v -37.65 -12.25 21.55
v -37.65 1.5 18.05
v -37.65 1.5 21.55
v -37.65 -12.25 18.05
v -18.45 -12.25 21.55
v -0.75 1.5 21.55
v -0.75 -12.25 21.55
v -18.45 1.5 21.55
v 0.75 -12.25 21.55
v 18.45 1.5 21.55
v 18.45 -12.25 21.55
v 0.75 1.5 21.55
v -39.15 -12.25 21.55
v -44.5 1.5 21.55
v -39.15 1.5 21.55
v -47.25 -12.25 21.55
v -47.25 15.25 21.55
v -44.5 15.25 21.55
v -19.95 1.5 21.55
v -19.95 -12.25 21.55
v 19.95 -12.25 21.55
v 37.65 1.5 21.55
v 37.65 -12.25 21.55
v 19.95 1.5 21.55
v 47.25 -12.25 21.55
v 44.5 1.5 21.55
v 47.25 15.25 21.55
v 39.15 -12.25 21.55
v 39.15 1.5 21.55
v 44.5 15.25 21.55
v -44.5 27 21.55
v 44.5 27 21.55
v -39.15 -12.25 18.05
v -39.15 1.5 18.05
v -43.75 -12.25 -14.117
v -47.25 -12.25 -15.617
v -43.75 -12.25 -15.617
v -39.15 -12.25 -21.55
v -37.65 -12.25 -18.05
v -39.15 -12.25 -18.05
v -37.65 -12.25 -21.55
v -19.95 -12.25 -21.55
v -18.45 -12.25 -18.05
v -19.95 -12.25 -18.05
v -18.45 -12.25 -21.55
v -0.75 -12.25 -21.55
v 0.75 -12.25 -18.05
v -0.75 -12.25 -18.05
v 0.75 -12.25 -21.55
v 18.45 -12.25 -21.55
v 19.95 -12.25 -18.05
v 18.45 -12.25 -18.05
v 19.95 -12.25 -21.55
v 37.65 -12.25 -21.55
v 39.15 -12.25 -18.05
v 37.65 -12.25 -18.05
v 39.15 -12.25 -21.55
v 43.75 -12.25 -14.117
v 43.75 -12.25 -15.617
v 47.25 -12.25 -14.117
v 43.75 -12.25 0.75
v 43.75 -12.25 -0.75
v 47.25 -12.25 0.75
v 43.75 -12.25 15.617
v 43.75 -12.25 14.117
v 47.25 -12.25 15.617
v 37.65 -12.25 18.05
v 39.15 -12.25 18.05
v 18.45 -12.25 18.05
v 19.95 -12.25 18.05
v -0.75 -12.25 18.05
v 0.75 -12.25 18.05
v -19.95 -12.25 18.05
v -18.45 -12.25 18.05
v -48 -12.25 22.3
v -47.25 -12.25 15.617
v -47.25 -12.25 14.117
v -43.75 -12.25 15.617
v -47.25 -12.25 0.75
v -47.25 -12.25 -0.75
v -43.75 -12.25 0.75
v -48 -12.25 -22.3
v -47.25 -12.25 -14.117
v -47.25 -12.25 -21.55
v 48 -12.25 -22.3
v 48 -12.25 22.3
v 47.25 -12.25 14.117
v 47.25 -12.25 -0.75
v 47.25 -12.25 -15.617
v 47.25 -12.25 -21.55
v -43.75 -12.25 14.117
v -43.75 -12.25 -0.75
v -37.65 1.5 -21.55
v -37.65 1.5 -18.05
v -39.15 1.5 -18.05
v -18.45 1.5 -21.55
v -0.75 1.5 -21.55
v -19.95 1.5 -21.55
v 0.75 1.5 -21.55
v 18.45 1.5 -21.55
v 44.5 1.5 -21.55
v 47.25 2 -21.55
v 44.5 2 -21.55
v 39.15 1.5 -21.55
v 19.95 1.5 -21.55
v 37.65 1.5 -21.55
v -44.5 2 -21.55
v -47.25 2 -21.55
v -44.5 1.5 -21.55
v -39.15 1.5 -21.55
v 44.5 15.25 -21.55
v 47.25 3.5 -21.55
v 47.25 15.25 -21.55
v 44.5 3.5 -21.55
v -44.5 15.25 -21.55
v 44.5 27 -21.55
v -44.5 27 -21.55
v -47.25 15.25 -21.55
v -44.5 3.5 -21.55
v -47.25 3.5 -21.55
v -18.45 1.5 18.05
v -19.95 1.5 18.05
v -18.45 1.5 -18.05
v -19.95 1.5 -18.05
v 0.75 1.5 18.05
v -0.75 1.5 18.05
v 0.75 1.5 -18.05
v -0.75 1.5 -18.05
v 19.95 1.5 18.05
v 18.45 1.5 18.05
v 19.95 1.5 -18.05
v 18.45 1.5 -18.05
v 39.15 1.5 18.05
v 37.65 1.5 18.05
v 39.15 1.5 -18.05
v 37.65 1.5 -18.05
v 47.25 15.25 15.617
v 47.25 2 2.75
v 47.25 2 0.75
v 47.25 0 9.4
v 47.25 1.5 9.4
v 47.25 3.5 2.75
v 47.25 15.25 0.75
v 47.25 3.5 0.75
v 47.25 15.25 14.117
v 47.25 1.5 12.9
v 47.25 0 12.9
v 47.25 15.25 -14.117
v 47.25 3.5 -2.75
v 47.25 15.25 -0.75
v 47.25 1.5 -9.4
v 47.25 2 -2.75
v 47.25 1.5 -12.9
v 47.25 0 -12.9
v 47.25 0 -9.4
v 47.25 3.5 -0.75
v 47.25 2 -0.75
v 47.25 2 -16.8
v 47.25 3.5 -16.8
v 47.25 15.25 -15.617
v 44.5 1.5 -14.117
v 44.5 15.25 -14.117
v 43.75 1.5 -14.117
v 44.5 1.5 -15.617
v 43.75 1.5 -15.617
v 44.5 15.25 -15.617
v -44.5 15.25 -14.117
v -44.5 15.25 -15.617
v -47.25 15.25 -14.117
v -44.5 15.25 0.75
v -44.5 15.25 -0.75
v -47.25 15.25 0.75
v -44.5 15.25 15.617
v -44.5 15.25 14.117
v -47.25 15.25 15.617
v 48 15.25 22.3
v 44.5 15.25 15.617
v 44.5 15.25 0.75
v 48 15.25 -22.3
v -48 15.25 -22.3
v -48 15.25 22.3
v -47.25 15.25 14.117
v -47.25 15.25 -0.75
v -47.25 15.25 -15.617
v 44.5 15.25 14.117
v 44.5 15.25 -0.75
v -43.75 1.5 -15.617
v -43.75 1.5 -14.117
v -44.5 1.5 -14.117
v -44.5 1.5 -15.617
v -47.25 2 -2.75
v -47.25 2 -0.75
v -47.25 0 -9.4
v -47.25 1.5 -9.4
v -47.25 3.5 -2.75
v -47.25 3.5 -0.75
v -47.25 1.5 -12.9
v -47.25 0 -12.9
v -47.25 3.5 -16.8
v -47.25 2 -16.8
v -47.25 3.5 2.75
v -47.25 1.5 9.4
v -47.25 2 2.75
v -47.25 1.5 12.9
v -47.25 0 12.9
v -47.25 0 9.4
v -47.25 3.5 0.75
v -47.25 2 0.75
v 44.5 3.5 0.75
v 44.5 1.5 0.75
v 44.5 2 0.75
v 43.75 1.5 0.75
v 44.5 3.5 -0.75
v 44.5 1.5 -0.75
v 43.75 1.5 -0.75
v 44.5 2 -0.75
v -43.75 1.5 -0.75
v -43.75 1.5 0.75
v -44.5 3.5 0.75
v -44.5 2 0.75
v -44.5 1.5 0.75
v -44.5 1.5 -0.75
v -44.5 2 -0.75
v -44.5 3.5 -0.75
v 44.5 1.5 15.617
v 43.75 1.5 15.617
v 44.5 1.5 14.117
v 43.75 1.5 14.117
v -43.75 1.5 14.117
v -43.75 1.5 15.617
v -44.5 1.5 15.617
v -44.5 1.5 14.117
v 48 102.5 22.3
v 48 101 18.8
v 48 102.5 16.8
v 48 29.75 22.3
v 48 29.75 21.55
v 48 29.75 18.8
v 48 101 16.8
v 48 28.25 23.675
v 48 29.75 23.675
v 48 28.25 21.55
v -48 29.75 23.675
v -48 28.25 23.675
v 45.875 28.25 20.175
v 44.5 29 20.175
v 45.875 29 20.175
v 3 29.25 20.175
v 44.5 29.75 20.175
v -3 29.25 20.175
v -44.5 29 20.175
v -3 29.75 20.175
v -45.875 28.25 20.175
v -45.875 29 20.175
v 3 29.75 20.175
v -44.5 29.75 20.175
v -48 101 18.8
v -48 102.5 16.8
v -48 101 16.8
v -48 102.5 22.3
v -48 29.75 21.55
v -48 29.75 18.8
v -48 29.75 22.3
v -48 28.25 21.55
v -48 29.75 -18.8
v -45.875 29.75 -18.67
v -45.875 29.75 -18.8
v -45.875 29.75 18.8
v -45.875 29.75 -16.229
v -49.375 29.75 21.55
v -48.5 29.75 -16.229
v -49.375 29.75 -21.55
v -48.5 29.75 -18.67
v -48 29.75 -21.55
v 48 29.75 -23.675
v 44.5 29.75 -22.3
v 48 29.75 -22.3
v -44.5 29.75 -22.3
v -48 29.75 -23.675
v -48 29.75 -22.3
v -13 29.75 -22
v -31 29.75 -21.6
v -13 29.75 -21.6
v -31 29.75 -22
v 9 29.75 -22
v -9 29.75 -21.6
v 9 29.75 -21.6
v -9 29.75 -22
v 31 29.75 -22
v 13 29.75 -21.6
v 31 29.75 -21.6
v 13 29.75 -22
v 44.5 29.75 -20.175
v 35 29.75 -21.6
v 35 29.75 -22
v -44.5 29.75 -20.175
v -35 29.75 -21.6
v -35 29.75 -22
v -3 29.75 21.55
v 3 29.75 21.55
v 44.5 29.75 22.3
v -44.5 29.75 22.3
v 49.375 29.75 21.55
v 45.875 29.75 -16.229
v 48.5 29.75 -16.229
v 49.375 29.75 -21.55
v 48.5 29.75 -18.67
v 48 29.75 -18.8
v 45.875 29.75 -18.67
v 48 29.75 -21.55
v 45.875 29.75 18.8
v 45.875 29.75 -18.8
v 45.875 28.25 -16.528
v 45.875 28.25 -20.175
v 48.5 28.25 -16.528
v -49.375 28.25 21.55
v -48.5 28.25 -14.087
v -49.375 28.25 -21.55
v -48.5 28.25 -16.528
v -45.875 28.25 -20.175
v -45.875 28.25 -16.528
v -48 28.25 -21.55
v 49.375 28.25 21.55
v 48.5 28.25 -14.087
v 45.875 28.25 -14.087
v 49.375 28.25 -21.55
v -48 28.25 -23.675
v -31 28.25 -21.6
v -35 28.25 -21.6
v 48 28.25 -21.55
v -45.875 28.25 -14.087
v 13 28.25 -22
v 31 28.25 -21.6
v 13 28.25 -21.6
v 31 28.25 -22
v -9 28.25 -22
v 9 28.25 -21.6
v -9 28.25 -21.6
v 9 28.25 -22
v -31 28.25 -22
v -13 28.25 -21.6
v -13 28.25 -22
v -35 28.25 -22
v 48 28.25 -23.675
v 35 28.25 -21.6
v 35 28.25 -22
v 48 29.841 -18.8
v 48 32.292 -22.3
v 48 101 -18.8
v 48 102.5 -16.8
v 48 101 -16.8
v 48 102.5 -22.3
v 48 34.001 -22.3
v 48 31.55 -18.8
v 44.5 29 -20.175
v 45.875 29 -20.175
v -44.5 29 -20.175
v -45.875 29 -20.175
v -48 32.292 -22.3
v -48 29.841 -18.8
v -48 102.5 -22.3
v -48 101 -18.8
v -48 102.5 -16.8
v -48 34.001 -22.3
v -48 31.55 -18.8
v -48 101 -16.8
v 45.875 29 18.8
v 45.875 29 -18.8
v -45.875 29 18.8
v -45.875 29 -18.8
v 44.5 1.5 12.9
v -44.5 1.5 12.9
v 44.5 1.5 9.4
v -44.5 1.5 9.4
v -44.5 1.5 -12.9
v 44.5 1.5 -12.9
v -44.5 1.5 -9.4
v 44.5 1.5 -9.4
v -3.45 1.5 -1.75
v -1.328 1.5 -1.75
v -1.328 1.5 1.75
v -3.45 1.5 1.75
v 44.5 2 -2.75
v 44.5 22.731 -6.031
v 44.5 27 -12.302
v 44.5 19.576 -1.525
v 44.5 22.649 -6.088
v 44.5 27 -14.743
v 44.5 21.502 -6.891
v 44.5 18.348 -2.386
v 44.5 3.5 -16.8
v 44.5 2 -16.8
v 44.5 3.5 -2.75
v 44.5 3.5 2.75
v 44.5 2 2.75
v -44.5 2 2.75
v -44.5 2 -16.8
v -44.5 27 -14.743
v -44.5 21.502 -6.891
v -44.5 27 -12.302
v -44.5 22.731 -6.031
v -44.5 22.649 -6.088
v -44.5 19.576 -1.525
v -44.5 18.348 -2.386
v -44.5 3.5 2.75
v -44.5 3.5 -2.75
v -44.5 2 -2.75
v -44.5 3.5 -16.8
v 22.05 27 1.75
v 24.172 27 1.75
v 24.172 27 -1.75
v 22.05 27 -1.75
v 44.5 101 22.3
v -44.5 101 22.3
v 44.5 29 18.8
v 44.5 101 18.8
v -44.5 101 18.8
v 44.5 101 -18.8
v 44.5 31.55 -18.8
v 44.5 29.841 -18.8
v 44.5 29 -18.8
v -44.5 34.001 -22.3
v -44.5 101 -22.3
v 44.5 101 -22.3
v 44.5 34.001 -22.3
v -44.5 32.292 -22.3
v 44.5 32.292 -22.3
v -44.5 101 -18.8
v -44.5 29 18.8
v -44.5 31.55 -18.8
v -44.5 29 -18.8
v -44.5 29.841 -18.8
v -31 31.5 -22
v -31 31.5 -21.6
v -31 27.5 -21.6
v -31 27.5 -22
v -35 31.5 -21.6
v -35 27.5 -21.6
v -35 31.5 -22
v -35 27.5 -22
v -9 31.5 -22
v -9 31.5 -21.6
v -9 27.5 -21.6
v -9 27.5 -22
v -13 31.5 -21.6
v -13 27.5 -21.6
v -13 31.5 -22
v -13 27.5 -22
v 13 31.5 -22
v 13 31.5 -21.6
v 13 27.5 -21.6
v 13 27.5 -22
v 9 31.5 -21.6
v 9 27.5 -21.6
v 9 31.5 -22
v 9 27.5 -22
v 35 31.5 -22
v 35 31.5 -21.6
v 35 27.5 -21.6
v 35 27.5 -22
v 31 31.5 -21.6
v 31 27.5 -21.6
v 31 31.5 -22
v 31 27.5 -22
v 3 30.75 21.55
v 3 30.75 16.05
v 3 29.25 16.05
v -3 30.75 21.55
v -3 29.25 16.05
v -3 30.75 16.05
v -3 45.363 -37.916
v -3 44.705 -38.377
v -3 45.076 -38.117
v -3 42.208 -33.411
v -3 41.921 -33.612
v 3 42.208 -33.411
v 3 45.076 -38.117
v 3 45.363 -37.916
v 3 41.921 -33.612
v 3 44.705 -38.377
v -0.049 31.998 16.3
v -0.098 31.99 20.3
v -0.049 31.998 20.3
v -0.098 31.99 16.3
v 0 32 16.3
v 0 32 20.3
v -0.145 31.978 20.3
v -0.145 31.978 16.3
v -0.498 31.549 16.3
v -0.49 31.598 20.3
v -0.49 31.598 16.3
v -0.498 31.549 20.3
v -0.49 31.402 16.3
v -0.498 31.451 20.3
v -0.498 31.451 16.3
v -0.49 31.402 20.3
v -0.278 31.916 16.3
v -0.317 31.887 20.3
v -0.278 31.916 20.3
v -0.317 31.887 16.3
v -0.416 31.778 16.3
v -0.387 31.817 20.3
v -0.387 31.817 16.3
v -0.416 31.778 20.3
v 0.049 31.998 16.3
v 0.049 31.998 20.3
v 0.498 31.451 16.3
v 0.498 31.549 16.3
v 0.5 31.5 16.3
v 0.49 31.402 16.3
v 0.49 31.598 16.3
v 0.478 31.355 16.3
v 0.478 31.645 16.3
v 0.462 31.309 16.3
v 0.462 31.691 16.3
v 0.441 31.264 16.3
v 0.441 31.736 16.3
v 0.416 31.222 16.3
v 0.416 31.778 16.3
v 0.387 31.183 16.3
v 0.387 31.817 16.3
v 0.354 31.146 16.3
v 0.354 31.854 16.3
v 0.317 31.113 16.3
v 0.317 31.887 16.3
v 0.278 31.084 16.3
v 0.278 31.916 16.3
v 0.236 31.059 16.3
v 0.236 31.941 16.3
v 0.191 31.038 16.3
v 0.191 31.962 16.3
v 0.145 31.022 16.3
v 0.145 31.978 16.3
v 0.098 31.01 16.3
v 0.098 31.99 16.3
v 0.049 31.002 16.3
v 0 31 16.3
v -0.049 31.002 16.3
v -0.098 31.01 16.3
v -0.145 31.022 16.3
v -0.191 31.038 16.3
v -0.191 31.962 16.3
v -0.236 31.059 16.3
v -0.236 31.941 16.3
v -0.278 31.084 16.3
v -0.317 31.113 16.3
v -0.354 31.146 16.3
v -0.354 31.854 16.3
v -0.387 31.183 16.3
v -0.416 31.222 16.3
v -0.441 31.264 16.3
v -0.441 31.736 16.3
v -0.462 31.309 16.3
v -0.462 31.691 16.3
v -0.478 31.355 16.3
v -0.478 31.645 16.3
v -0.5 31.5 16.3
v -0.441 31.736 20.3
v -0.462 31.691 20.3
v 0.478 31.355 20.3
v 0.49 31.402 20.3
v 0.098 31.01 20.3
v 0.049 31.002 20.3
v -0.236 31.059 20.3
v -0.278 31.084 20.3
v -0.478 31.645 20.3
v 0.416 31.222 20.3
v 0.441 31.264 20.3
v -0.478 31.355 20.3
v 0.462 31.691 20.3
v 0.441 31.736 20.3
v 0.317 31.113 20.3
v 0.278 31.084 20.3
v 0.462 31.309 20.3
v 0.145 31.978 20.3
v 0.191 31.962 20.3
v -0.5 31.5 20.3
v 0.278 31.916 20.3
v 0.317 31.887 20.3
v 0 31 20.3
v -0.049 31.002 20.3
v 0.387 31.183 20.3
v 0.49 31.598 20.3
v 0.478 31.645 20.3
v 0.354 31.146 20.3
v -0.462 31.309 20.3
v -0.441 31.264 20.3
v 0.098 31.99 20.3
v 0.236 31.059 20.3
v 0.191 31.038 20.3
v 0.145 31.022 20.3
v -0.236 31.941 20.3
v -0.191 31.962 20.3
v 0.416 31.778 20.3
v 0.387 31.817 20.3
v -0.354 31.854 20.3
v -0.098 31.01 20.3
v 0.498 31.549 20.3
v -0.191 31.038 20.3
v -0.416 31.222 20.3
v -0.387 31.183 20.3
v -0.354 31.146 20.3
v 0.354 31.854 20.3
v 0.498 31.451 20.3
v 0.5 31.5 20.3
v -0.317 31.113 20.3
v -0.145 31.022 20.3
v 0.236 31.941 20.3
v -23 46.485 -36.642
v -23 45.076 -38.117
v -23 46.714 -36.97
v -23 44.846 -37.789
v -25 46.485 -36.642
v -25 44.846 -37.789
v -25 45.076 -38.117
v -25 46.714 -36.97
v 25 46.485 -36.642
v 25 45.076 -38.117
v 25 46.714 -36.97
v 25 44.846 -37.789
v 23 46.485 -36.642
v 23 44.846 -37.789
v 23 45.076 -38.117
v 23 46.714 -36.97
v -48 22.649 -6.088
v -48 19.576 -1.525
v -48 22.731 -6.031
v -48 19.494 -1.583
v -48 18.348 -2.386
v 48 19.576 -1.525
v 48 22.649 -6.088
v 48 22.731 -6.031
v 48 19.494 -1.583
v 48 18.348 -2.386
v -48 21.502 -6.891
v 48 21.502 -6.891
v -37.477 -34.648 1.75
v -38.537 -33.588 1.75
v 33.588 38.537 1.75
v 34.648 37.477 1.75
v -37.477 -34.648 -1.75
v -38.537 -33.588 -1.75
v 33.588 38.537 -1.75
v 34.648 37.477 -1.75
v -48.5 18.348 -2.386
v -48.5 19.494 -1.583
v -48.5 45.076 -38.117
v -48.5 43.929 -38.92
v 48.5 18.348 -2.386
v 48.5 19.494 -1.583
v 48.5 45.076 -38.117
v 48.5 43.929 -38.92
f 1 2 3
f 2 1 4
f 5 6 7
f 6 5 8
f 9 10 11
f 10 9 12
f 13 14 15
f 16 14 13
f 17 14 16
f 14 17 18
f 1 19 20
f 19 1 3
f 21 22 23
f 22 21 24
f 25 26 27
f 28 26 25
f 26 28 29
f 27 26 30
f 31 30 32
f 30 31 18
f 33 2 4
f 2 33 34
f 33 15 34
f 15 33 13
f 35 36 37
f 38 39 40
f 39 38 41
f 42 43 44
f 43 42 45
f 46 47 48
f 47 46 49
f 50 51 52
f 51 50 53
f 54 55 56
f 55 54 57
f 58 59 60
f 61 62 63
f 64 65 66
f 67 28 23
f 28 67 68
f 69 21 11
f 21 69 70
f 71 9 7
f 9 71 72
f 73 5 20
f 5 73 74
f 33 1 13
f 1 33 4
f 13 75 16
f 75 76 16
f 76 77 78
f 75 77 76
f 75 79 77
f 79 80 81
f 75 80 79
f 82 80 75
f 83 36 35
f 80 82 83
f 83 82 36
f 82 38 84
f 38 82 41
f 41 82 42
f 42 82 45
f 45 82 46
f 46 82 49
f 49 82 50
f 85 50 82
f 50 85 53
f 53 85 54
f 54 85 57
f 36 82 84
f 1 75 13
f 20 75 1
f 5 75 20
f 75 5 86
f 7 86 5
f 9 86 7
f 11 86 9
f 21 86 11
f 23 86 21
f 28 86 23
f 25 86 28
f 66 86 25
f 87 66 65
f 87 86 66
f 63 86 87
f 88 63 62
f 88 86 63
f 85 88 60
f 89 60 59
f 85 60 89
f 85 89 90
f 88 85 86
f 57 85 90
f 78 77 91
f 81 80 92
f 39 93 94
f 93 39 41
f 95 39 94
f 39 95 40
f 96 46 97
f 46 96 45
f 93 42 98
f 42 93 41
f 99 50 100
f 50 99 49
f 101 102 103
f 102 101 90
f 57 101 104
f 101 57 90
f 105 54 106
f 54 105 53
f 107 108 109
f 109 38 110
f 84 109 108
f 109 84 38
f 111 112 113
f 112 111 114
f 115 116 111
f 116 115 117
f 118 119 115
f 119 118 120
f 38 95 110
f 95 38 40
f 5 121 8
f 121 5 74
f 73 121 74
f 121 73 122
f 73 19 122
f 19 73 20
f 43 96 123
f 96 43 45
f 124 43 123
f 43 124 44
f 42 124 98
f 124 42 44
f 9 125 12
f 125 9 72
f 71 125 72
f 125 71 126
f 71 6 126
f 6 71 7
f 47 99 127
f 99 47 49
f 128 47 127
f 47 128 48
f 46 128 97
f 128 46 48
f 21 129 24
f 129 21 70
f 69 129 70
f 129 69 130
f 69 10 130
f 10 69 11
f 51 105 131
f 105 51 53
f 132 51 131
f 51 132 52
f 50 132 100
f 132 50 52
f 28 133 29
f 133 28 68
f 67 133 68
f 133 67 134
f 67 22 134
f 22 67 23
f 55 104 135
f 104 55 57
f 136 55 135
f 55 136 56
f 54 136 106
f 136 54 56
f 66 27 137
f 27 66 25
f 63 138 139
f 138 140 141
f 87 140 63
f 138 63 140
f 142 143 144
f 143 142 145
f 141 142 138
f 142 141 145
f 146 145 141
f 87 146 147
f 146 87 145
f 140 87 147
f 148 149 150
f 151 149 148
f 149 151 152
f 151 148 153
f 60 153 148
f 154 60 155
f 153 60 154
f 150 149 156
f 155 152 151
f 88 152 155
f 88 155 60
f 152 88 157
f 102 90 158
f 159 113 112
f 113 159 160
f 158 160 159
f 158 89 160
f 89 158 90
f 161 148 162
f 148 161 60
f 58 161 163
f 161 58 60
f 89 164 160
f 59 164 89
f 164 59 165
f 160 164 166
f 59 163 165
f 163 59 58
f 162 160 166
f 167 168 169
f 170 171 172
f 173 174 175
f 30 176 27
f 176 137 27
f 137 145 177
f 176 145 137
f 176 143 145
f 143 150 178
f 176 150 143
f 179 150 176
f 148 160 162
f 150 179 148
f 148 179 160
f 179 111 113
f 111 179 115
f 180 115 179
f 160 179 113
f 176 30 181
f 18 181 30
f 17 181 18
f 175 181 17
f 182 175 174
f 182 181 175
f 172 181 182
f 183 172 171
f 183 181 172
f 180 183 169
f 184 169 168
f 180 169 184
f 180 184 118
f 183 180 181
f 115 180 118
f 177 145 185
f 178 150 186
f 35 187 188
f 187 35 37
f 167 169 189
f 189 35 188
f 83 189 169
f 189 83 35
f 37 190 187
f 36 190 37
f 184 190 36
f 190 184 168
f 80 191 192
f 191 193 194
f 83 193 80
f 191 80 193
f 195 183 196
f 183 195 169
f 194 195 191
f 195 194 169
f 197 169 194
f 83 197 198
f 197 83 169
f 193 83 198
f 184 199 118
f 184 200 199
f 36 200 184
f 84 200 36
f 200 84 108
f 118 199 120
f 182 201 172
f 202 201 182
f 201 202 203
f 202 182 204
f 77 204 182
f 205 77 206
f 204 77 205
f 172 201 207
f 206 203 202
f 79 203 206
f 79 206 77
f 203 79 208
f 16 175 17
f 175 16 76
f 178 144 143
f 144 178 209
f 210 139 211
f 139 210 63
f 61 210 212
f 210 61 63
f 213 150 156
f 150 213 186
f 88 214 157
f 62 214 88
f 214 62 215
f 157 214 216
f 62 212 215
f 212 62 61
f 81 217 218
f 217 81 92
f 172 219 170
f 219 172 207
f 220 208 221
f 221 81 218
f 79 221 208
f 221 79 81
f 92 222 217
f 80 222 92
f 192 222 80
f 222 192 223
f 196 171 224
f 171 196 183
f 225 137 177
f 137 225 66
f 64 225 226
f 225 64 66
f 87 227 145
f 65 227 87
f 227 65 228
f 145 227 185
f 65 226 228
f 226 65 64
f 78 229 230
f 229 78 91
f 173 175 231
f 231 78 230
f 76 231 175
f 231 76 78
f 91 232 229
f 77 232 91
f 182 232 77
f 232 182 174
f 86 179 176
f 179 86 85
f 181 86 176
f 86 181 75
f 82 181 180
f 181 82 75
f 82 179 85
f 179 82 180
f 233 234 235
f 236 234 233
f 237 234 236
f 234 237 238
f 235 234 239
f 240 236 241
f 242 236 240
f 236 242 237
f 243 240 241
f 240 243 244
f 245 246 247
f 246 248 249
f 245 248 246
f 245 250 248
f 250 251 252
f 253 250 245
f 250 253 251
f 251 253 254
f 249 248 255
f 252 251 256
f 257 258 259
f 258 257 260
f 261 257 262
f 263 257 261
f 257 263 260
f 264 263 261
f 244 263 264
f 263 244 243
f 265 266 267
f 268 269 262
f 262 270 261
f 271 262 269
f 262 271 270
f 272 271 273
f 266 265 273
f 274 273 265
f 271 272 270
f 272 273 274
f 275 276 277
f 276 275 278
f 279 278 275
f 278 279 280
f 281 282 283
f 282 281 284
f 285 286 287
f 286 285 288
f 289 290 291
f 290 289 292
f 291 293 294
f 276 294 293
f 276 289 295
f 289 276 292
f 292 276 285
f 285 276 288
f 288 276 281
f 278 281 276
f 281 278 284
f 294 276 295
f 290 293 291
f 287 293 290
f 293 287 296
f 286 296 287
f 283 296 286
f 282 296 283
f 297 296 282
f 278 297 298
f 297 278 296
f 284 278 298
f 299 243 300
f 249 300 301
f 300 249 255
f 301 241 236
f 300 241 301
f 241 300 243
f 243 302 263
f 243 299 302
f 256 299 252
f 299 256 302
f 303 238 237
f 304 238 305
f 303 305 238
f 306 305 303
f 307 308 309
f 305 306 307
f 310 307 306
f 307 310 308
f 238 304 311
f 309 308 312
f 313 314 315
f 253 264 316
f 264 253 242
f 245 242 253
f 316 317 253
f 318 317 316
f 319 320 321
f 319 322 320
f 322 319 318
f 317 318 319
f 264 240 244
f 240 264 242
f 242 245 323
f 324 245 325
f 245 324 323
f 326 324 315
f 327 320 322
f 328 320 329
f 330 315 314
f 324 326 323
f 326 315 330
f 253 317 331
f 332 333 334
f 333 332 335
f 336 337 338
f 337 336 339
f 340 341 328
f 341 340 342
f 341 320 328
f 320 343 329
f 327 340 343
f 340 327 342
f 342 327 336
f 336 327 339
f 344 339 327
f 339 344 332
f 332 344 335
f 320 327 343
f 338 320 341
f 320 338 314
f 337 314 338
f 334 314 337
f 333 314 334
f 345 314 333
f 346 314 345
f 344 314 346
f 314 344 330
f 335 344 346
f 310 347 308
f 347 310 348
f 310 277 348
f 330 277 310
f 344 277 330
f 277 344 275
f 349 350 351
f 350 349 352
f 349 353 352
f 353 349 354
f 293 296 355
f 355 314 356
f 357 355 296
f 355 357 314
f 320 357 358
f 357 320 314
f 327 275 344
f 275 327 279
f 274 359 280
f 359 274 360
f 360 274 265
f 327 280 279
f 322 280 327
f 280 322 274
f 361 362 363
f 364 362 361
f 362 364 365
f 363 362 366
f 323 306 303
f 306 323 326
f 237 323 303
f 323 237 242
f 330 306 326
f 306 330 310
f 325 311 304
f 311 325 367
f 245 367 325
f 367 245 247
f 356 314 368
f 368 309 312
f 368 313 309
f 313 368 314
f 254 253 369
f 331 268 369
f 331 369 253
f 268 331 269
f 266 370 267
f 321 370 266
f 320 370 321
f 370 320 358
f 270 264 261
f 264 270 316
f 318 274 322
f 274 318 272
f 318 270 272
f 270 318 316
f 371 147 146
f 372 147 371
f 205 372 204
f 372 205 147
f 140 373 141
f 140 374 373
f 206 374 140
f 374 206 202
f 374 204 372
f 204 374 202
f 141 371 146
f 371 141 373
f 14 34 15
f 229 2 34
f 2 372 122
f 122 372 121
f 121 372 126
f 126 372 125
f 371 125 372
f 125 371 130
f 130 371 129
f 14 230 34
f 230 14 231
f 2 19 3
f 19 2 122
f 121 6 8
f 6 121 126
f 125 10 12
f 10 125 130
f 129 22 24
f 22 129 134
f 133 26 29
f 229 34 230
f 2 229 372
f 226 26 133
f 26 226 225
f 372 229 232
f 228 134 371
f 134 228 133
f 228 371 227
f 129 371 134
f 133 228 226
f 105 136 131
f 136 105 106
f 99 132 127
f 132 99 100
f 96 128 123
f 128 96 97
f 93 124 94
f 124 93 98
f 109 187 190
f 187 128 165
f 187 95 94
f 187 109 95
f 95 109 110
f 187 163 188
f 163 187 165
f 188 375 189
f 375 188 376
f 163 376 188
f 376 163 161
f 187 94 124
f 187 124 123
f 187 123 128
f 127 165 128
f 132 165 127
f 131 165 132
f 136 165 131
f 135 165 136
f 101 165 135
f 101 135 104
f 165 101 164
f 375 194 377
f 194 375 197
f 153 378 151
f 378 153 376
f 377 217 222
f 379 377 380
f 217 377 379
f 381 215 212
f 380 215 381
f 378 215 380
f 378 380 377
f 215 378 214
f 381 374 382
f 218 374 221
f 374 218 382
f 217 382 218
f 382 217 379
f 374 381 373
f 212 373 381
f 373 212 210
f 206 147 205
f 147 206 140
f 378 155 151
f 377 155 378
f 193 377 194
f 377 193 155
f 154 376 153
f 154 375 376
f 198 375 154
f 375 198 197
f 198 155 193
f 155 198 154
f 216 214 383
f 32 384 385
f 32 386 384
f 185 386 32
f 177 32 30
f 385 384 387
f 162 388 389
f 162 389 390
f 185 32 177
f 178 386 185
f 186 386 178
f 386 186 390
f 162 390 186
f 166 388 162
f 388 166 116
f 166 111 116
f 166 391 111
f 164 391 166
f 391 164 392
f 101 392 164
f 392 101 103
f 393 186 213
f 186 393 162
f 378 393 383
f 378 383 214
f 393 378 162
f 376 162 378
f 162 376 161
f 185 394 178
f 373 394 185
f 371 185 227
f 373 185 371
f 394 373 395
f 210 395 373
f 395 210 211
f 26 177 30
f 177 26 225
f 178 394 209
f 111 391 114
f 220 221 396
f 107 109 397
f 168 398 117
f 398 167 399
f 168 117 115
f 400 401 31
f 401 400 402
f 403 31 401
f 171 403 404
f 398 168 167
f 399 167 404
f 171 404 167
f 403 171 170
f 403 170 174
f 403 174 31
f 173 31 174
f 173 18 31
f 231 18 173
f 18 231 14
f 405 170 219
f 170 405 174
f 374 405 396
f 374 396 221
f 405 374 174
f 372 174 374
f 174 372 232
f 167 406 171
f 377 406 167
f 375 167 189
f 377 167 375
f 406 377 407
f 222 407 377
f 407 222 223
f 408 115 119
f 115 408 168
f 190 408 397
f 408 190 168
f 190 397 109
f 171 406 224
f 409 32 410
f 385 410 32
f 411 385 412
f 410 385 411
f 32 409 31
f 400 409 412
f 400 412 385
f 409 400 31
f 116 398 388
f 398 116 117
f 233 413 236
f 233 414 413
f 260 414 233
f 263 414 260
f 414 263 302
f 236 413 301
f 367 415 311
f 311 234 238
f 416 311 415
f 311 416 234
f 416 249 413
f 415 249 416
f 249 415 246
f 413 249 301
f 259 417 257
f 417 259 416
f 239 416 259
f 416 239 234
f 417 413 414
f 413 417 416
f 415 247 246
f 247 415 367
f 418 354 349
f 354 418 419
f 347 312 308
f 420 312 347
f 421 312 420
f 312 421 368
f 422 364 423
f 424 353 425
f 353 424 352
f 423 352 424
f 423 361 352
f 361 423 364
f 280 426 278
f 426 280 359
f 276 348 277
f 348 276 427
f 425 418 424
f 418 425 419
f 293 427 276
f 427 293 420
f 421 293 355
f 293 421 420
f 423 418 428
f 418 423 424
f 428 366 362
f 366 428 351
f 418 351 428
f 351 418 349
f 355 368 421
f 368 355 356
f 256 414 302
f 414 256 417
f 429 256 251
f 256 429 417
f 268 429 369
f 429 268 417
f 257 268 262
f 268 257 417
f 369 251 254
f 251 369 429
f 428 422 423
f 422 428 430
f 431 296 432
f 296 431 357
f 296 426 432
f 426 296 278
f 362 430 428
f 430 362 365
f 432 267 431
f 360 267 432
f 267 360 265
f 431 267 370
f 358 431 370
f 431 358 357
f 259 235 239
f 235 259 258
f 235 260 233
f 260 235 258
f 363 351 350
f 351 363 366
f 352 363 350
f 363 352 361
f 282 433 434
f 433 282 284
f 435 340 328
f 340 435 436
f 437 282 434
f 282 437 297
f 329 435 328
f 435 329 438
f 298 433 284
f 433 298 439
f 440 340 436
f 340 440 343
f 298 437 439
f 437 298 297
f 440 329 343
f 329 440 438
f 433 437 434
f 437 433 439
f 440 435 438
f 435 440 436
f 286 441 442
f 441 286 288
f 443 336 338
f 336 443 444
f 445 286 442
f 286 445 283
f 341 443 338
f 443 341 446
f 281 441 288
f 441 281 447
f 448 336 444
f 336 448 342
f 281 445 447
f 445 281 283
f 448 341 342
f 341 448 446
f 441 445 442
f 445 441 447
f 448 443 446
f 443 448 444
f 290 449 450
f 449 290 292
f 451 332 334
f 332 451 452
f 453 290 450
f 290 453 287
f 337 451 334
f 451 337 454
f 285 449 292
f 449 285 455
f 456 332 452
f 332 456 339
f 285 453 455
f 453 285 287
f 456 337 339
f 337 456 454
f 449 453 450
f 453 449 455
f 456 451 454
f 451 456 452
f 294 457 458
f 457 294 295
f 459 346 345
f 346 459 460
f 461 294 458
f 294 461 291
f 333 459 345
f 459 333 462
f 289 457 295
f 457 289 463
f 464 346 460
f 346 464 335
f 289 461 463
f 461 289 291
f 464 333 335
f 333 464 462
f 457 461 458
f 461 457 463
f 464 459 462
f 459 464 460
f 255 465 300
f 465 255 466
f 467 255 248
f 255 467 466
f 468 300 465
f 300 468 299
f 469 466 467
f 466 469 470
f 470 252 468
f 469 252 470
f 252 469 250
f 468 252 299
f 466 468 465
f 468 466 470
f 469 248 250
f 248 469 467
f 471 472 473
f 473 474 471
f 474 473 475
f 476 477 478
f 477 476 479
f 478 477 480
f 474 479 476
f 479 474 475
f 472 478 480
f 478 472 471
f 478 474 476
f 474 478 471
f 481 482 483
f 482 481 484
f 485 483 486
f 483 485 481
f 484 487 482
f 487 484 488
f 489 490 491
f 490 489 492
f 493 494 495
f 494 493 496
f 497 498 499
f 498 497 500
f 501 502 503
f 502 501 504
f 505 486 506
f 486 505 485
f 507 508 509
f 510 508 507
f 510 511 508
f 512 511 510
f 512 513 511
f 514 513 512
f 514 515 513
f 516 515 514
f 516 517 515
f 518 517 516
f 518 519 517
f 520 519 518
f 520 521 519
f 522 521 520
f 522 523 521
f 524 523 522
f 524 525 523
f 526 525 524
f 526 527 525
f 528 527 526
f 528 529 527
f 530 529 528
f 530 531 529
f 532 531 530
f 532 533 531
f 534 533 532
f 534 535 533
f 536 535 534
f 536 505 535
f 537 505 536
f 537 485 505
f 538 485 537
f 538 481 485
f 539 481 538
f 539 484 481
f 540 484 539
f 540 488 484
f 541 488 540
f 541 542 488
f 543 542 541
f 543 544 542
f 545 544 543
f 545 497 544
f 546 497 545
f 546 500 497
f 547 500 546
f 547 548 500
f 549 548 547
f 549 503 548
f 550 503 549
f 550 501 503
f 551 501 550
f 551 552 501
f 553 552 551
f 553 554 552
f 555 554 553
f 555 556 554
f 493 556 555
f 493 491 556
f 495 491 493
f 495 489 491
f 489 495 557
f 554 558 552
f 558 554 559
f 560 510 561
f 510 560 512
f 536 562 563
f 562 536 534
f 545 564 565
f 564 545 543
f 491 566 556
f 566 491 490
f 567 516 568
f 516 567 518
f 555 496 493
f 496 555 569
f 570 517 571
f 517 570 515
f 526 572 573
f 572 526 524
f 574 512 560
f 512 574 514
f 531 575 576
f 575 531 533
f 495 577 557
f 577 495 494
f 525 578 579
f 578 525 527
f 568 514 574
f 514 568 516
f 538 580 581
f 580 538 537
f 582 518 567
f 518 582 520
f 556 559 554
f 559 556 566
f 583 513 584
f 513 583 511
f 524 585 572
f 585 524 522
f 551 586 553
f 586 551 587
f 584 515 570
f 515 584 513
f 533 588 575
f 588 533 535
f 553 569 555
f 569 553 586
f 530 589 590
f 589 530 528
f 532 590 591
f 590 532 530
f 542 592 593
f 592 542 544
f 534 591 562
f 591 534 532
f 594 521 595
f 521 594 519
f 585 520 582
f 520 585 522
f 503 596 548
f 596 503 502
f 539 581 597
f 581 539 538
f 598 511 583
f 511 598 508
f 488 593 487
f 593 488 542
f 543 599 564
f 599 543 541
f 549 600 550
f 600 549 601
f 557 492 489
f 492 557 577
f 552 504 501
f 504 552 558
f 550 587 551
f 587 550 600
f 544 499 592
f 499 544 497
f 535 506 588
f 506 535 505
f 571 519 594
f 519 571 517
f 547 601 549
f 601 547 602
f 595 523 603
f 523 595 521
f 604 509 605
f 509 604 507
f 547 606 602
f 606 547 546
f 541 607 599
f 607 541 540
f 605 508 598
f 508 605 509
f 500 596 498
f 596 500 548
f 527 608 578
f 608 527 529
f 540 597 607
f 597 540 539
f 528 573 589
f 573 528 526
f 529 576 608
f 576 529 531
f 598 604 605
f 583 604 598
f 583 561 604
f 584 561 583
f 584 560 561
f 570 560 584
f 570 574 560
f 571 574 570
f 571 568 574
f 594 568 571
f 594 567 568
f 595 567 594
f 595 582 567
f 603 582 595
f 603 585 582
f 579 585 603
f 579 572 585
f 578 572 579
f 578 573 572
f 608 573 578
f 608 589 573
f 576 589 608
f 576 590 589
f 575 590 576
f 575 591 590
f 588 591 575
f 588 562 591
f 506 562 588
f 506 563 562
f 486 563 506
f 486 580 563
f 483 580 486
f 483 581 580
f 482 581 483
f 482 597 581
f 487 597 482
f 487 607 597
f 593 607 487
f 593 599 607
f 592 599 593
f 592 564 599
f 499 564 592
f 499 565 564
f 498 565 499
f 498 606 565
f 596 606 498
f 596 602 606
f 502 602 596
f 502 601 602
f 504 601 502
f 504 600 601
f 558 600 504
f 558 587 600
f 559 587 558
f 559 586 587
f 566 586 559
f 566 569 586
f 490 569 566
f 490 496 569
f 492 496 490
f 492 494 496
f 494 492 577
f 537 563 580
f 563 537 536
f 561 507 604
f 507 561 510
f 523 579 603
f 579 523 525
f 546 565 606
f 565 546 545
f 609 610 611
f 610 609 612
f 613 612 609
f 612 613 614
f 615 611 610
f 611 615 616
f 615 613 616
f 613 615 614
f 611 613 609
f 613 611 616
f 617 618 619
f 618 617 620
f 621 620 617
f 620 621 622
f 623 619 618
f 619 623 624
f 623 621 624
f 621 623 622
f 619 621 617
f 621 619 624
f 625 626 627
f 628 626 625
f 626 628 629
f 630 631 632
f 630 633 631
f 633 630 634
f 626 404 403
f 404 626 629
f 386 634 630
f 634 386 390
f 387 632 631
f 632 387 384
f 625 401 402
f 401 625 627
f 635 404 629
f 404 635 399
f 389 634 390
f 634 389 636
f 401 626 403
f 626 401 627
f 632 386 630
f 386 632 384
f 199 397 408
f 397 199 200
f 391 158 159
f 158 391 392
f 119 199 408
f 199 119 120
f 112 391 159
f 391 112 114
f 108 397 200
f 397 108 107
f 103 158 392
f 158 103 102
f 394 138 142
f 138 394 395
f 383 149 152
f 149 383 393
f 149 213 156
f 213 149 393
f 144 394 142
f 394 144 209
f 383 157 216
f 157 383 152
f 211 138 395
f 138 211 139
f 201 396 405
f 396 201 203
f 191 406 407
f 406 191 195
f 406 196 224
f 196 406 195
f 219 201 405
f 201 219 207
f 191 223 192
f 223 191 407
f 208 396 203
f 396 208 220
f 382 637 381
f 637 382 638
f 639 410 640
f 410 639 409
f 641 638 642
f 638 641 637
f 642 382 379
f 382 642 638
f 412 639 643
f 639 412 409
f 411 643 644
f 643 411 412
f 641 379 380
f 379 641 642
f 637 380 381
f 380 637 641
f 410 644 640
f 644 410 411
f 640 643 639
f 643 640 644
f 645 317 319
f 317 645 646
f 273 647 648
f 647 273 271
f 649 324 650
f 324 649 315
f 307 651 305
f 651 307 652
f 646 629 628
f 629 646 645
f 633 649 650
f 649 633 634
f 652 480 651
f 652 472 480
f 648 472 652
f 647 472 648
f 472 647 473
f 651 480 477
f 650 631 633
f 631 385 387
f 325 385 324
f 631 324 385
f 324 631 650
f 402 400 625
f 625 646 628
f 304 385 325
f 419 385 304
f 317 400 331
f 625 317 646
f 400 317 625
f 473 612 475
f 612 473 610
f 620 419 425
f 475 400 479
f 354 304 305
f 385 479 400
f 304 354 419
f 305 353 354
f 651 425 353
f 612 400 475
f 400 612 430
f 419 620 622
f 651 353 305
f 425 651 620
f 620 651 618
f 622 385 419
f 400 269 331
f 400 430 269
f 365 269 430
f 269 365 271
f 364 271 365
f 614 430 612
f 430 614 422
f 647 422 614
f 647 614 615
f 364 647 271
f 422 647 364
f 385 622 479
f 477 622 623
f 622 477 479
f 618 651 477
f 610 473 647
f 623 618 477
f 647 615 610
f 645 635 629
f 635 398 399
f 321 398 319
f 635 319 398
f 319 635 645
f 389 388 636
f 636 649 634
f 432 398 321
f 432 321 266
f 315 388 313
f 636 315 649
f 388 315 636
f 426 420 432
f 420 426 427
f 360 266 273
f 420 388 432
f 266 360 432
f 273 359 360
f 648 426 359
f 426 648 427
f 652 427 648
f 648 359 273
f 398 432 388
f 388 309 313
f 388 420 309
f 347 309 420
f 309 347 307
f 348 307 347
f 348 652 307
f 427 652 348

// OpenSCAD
// file: ../wattplot_params.scad
// =============================================================================
// wattplot_params.scad -- mirror of wattplot_params.py
// =============================================================================
//
// DO NOT EDIT THESE NUMBERS WITHOUT UPDATING wattplot_params.py AND
// firmware/tests/test_openscad_params.py.
//
// The Python source of truth is wattplot_params.py at the repo root.
// This file is a hand-maintained mirror so the OpenSCAD models can
// render without Python. A CI test (test_openscad_params.py) reads
// both and fails if any number has drifted.
//
// If you change a value here, change it in wattplot_params.py first
// and update the test expectations in test_openscad_params.py. The
// commit message should reference the param name (e.g.
// "scad: bump POSTS.height_in to 78 for v3.1 storm margin").
//
// All dimensions are in inches. OpenSCAD's $fn controls mesh
// resolution -- 64 gives a clean STL that's about 2 MB at this
// model's complexity.

// ---------- LOCATION ----------
location_latitude  = 33.45;     // Phoenix, AZ
location_longitude = -112.07;
location_elevation_m = 337;
location_design_wind_mph = 115.0; // ASCE 7-22, Risk Cat II 700-yr

// ---------- PLANTER LIMITS ----------
max_planter_L_in = 96.0;          // 8 ft stock, no waste on long rails
max_planter_W_in = 60.0;          // 5 ft (8 ft cross-cut, 2 cross-rails per board)

// ---------- BED (planter, ballasted) ----------
bed_outer_L_in       = 96.0;       // 8 ft (capped at max_planter_L_in)
bed_outer_W_in       = 44.6;       // matches panel width
bed_wall_thk_in      = 0.75;       // 1x6 cedar (3/4" actual)
bed_wall_h_in        = 27.5;       // 5 courses of 1x6 (5.5" actual)
                                   //   wind-sized: SF_overturning 2.55 at 35°
bed_soil_fill_in     = 25.5;       // 2" freeboard below the rim
                                   //   ~60 cu ft = 2.2 cu yd = ~4,000 lb
bed_skid_h_in        = 1.5;        // walls rest on 2x4 footers
bed_skid_side_in     = 3.5;        // 4x nominal

// ---------- BED WALL (1x6 cedar skin over 2x4 cleats) ----------
wall_skin_thk_in   = 0.75;
wall_course_h_in   = 5.5;
wall_courses       = 5;            // 5 x 5.5" = 27.5" wall
wall_cleat_thk_in  = 1.5;          // 2x4 actual
wall_cleat_wid_in  = 3.5;          // 2x4 actual
wall_cleats_long   = 5;            // per long wall
wall_cleats_short  = 3;            // per short wall
wall_header_thk_in = 1.5;         // 2x4 on wide face
wall_header_wid_in = 3.5;

// ---------- POSTS (4x4 PT, 72" tall, walk-under canopy) ----------
post_thk_in  = 3.5;               // 4x4 actual
post_height_in = 72.0;            // 6 ft -- walk-under / reach-under
post_count   = 4;
post_rail_thk_in = 1.5;          // 2x6 on post tops
post_rail_wid_in = 5.5;

// ---------- PANEL (LONGi Hi-MO X10 620W default) ----------
panel_L_in        = 97.0;         // 8.08 ft (overhangs bed 0.5"/side)
panel_W_in        = 44.6;         // 3.72 ft
panel_thk_in      = 1.4;
panel_mass_lb     = 65.0;
panel_wattage     = 620;
panel_tilt_deg    = 35.0;         // 0 = flat, 35 = max (wind-limited)

// ---------- CONTROL (tilt cap + PI setpoint) ----------
control_max_tilt_deg  = 35.0;     // STRUCTURAL cap. See ADR-001.
control_target_current_A = 0.5;
control_hard_current_limit_A = 2.5;

// ---------- FRAME (perimeter around the panel) ----------
frame_long_rail_thk_in   = 1.5;    // 2x6 actual
frame_long_rail_wid_in   = 5.5;
frame_long_rail_length_in = 96.0;  // 8 ft stock, no waste

frame_cross_rail_thk_in   = 1.5;   // 2x6 actual
frame_cross_rail_wid_in   = 5.5;
frame_cross_rail_length_in = 42.0; // 2x6x8ft cut to 42"

frame_brace_thk_in   = 1.5;         // 2x4 actual
frame_brace_wid_in   = 3.5;
frame_brace_length_in = 102.0;     // 2x4x10ft cut to 102"

// ---------- HINGES + PANEL CLAMPS ----------
hinge_leaf_in    = 4.0;            // 4"x4" leaf, 1/2" pin
hinge_pin_d_in    = 0.5;
hinge_count      = 4;
hinge_spacing_in = 22.0;           // 22" o.c.
hinge_rod_length_in = 72.0;        // 1/2" x 72" steel rod (HD)

panel_clamp_length_in = 2.0;       // IronRidge mid-clamp, 35mm channel
panel_clamp_height_in = 2.0;
panel_clamp_thk_in   = 0.4;
panel_clamps_per_long_rail  = 2;
panel_clamps_per_cross_rail = 1;

// ---------- ACTUATOR MOUNT ----------
actuator_block_thk_in  = 1.5;      // 2x6 actual
actuator_block_wid_in  = 5.5;
actuator_block_length_in = 6.0;
actuator_stroke_in     = 4.0;       // 12V linear actuator
actuator_width_in      = 2.0;       // body width (for clearance check)
actuator_height_in     = 2.5;

// ---------- DERIVED (don't change) ----------
// Bed is sized so the panel overhangs the rails by 0.5" per side.
// The panel mid-clamps grip the aluminum frame, not the glass.
bed_inner_L_in = bed_outer_L_in - 2 * post_thk_in;
bed_inner_W_in = bed_outer_W_in - 2 * wall_skin_thk_in;
// Wall sits on top of skid; rim = wall + skid.
bed_rim_h_in = bed_wall_h_in + bed_skid_h_in;
// Panel frame offset above the bed rail (clearance for the clamp).
panel_clearance_in = 2.0;         // 2" above the rail top

// Render resolution: $fn controls segment count for curves.
// 64 gives a clean STL ~2 MB. Lower for fast preview, higher for
// 3D printing.
$fn = 64;
// main file
// presets/residential_72cell.scad -- common 2012-2018 salvage (e.g. Canadian Solar CS6K-300)

include <../wattplot_params.scad>
panel_L_in     = 77.0;
panel_W_in     = 39.0;
panel_wattage  = 300;

use <../wattplot.scad>

if (is_undef($use_only)) {
    $fn = 64;
    bed_assembly();
    posts_assembly();
    hinges_assembly();
    actuator_assembly();
    frame_assembly();
    panel_assembly();
}
